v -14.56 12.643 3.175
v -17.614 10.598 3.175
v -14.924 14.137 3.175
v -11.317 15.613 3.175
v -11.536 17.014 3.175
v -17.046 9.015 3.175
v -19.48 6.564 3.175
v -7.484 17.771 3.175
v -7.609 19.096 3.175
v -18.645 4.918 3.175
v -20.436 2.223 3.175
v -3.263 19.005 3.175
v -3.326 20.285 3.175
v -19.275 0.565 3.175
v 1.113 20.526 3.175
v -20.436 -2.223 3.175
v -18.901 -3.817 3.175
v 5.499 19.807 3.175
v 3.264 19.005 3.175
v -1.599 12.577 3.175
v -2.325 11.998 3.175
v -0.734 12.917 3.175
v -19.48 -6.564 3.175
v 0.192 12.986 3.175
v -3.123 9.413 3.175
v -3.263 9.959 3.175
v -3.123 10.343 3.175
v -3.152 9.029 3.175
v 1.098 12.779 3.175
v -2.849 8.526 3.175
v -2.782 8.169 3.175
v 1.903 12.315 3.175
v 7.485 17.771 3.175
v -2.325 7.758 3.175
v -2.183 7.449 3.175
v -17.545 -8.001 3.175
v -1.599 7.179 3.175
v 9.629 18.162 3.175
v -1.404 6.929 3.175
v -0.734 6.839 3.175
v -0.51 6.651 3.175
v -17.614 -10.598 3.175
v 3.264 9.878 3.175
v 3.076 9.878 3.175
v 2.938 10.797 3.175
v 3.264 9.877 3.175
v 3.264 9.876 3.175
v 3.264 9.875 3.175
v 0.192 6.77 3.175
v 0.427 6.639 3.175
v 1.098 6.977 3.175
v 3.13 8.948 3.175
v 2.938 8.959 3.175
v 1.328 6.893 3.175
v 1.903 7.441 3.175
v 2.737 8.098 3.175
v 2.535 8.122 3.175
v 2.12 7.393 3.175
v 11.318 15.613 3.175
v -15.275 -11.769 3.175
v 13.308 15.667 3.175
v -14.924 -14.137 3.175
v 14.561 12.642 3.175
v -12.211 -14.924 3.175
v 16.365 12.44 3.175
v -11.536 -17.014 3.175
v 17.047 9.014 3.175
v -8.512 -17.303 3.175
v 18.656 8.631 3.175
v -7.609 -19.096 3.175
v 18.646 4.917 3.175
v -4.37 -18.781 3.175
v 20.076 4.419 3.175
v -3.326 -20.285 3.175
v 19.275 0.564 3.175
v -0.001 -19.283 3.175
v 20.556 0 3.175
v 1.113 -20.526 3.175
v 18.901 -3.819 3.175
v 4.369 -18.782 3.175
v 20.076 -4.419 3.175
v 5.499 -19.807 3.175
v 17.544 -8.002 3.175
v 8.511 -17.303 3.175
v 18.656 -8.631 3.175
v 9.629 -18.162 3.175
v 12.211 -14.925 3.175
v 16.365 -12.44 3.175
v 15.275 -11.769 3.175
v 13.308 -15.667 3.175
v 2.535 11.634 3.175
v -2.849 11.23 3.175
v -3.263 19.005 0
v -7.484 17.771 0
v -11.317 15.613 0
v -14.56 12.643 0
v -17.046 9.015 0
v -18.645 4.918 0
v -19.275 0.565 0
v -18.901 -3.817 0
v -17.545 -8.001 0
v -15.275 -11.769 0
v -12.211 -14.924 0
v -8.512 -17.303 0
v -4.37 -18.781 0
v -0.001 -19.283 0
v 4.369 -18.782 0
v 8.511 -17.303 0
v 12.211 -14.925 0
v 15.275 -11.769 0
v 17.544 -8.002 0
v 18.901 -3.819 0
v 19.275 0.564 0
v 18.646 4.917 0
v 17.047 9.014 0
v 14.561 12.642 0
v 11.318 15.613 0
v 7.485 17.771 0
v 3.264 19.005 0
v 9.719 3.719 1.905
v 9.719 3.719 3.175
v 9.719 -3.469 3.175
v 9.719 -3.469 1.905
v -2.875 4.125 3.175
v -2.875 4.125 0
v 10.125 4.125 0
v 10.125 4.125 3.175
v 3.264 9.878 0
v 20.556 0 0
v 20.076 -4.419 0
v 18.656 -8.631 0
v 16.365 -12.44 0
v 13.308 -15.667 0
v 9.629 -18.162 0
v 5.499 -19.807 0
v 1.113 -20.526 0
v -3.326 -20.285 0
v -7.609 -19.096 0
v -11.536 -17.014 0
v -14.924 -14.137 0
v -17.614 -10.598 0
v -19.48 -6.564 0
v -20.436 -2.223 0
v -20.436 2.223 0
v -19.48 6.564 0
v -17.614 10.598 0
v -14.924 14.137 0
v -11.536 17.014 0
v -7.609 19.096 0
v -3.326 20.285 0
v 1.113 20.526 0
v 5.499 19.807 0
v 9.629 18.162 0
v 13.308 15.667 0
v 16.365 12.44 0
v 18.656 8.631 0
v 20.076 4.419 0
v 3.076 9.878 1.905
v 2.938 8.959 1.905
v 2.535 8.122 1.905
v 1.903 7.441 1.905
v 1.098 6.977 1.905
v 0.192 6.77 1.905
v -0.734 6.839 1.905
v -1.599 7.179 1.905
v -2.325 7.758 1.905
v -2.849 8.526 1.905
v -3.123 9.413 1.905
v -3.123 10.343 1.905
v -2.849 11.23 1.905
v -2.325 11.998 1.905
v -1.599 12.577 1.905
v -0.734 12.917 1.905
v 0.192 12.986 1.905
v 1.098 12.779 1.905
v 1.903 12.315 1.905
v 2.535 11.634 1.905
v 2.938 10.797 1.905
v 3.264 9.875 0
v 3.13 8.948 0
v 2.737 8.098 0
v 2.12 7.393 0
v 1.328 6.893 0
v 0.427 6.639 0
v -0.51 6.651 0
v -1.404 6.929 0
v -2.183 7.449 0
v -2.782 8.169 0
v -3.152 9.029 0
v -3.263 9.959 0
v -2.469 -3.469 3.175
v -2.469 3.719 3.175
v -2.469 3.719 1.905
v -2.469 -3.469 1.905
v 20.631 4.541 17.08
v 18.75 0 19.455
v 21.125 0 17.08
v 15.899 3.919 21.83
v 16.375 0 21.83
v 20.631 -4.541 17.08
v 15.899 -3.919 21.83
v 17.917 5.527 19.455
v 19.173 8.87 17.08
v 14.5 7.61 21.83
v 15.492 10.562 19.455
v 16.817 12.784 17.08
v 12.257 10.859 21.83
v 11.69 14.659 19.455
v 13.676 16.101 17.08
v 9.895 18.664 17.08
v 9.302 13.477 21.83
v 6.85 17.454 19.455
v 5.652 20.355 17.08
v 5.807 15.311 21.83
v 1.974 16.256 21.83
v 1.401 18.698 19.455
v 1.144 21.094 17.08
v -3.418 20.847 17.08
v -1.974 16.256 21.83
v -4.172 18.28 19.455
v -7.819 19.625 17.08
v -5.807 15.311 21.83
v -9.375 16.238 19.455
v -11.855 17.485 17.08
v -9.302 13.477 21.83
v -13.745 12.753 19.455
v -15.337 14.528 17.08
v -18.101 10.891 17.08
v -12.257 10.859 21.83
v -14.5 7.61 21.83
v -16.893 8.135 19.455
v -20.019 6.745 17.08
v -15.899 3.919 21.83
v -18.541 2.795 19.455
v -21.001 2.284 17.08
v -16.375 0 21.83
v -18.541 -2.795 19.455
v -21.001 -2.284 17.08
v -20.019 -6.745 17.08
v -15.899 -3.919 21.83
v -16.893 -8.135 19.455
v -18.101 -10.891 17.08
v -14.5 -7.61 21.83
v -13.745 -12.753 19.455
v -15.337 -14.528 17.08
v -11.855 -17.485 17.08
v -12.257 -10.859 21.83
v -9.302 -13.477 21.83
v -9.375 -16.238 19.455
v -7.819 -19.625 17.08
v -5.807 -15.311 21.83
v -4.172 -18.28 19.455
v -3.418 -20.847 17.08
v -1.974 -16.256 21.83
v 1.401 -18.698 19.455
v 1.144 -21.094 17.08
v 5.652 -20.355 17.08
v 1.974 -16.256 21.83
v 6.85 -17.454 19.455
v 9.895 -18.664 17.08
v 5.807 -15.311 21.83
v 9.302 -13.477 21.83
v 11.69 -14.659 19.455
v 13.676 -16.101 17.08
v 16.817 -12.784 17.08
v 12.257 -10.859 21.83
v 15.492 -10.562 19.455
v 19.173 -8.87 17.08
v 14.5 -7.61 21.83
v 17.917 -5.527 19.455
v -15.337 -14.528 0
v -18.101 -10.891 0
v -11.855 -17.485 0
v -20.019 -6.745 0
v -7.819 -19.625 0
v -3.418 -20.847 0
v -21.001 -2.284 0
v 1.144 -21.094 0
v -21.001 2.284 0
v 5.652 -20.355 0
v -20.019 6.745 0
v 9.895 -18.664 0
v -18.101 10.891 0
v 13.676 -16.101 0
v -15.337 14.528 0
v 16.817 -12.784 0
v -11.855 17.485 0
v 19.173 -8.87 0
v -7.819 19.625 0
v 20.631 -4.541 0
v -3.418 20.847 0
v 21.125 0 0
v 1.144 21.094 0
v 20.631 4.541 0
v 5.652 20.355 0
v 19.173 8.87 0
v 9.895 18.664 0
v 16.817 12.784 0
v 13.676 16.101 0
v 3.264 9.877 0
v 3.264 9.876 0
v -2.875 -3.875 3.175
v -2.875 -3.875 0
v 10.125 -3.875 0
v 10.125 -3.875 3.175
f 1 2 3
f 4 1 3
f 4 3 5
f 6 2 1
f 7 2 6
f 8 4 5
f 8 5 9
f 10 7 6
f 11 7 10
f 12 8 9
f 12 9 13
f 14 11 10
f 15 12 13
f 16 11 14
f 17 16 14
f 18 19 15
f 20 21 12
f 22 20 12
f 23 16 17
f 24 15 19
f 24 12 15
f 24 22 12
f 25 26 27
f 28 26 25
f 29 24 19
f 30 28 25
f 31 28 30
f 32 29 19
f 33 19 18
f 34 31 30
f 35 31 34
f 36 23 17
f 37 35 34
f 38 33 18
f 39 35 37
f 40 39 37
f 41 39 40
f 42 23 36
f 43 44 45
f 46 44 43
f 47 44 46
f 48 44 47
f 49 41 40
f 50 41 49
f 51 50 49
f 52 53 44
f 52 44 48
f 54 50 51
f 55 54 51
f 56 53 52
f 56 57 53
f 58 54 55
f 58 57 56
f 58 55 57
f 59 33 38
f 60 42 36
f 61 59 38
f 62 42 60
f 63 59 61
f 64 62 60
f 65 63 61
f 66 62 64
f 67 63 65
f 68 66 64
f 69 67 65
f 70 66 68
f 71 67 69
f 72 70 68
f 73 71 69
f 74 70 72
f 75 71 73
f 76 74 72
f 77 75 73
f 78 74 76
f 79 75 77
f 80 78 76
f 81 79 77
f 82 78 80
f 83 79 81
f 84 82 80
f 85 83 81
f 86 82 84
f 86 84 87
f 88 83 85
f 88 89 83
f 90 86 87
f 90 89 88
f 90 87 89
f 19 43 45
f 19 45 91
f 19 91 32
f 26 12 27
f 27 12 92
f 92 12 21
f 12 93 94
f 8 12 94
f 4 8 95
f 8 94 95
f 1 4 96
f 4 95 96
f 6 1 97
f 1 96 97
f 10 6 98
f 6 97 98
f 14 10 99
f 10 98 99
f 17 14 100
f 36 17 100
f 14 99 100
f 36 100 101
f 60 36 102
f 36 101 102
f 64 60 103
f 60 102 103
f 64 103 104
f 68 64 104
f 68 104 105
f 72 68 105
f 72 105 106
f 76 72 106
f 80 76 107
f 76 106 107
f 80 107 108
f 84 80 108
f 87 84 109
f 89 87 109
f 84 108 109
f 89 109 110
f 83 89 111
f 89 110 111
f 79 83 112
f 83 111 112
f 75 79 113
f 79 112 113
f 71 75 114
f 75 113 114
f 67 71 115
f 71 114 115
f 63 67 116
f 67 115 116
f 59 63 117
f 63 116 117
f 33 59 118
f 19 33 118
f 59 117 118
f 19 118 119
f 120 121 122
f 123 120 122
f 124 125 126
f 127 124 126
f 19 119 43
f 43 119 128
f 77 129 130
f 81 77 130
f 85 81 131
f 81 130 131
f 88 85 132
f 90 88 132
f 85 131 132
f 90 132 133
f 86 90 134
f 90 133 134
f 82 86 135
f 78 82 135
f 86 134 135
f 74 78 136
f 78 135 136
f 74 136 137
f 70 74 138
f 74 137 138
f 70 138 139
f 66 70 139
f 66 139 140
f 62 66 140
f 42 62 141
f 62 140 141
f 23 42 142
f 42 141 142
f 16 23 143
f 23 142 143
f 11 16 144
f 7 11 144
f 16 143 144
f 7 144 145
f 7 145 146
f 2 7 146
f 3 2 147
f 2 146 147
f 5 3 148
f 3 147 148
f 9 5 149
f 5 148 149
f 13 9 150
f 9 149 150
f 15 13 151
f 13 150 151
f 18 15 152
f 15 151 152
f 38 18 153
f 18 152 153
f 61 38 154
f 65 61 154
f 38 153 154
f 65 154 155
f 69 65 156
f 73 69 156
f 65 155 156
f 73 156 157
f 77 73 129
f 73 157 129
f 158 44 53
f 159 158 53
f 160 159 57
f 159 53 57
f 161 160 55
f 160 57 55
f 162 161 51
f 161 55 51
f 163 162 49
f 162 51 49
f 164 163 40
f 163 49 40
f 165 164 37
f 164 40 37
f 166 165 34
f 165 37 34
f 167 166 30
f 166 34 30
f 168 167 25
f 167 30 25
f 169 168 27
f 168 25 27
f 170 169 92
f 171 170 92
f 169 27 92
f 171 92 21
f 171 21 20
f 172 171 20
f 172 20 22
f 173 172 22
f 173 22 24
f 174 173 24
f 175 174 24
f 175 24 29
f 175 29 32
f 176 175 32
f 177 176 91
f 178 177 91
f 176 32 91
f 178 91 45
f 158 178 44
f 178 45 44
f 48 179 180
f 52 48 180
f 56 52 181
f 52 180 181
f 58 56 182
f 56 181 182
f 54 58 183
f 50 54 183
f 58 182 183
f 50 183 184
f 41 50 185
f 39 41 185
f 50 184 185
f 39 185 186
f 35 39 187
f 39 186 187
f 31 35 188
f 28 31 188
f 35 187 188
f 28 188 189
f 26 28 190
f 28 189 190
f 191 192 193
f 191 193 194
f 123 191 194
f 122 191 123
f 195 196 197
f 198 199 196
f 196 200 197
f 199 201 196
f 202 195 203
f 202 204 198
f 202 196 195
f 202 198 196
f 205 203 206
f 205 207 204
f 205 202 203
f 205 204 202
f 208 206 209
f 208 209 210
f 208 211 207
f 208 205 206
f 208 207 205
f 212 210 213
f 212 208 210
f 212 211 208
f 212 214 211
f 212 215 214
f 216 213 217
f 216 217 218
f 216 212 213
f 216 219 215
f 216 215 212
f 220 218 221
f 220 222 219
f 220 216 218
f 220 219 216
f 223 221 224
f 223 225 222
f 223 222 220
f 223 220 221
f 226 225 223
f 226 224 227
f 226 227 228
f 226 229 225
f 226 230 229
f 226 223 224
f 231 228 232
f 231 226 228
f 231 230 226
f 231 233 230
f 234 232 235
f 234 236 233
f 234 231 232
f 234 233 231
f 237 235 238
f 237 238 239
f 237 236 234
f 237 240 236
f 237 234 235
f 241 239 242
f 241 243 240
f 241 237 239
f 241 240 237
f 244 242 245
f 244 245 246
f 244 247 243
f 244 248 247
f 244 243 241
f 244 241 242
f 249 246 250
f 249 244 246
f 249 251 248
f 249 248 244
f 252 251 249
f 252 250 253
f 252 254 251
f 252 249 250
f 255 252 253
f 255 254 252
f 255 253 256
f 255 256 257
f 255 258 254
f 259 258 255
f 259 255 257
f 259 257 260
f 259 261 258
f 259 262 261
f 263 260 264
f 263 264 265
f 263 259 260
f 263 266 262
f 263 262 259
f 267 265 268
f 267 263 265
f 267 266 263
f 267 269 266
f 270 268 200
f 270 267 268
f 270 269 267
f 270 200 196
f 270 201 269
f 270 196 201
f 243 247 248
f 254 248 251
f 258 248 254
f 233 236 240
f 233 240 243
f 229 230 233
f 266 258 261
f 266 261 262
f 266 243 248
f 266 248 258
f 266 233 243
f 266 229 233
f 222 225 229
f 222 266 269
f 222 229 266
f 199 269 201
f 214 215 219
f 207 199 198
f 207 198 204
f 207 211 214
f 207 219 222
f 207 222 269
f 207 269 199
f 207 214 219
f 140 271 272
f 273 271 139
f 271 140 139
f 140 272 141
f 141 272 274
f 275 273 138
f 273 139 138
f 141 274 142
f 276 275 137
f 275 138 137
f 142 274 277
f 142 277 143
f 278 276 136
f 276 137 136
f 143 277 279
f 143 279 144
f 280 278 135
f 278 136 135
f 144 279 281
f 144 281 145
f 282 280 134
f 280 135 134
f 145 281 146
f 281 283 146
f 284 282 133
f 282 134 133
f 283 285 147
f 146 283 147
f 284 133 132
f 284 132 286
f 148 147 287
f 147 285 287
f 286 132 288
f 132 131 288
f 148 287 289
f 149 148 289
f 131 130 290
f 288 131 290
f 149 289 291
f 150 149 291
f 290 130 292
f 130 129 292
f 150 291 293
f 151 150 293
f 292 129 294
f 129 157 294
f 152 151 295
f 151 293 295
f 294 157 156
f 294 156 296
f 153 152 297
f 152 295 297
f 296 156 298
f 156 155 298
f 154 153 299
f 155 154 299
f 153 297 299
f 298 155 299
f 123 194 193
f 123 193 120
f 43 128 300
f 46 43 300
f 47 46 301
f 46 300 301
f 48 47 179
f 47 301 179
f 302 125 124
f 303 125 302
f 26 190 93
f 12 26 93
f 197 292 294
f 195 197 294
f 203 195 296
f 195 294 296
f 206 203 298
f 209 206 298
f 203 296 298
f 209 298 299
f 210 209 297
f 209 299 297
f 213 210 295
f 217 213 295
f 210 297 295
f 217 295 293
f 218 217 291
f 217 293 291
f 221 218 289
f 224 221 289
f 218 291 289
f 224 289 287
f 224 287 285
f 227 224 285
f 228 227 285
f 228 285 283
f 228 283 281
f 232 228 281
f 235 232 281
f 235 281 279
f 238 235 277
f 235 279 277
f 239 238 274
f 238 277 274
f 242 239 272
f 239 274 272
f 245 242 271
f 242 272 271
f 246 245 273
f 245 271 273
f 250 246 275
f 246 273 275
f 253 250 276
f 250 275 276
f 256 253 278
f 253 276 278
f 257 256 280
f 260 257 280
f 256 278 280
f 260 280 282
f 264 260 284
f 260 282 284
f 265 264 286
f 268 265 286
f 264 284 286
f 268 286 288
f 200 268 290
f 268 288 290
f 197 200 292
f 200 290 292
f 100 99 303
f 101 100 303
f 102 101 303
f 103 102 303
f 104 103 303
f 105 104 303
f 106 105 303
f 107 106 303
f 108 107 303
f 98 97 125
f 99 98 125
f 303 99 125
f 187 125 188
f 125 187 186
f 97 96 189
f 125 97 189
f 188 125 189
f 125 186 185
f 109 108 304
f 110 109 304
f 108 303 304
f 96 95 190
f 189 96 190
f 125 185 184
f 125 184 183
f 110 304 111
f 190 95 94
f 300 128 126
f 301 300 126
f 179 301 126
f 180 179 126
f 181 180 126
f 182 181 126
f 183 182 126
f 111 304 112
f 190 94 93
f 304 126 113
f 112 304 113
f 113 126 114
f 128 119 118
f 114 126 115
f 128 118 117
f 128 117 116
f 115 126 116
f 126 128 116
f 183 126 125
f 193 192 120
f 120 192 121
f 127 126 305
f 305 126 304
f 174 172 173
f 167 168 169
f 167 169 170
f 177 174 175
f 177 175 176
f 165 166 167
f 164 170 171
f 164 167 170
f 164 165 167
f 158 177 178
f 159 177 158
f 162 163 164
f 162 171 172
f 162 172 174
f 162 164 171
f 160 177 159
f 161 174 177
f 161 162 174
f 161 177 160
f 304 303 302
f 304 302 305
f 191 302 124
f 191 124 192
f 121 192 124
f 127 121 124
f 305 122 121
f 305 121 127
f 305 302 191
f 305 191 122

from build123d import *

# Parameters (mm, degrees)
F0_R     = 21.125
F1_DEPTH = 21.83
F2_SIZE  = 4.7498
F3_R     = 20.5562247393
F3_W     = 13
F3_H     = 8
F4_DEPTH = 3.175
F5_W     = 12.1872002035
F5_H     = 7.1872002035
F5_R     = 3.1168821316
F6_DEPTH = 1.27


with BuildPart() as f1:
    # F0 (on Top) → F1 (new body)
    with BuildSketch(Plane.XY):
        Circle(F0_R)
    extrude(amount=F1_DEPTH)

    # F2
    f2_edges = [f1.edges().sort_by_distance(p)[0] for p in [
        (-21.125, 0, 21.83),
    ]]
    chamfer(f2_edges, length=F2_SIZE)

    # F3 (on face) → F4 (cut)
    with BuildSketch(Plane(origin=(0, 0, 0), x_dir=(1, 0, 0), z_dir=(0, 0, -1))):
        Circle(F3_R)
        with BuildLine():
            ThreePointArc((3.2638985791, -9.8780455391), (0.0405954465, -13.138647533), (-3.2628129974, -9.9592291742))
            Line((-3.2628129974, -9.9592291742), (-3.2628129974, -19.0050496832))
            ThreePointArc((-3.2628129974, -19.0050496832), (-0.0005507347, 19.2830978272), (3.2638985791, -19.0048632772))
            Line((3.2638985791, -19.0048632772), (3.2638985791, -9.8780455391))
        make_face(mode=Mode.SUBTRACT)
        with Locations((3.625, -0.125)):
            Rectangle(F3_W, F3_H)
        with BuildLine():
            ThreePointArc((3.2638985791, -9.8780455391), (3.2638996448, -9.8765227697), (3.2639, -9.875))
            ThreePointArc((3.2639, -9.875), (-0.042118094, -6.611371762), (-3.2628129974, -9.9592291742))
            ThreePointArc((-3.2628129974, -9.9592291742), (0.0405954465, -13.138647533), (3.2638985791, -9.8780455391))
        make_face()
    extrude(amount=-F4_DEPTH, mode=Mode.SUBTRACT)

    # F5 (on face) → F6 (join)
    with BuildSketch(Plane(origin=(0, 0, 3.175), x_dir=(1, 0, 0), z_dir=(0, 0, -1))):
        with Locations((3.625, -0.125)):
            Rectangle(F5_W, F5_H)
        with Locations((-0.0405954465, -9.8780455391)):
            Circle(F5_R)
    extrude(amount=F6_DEPTH)


solid = f1.part
